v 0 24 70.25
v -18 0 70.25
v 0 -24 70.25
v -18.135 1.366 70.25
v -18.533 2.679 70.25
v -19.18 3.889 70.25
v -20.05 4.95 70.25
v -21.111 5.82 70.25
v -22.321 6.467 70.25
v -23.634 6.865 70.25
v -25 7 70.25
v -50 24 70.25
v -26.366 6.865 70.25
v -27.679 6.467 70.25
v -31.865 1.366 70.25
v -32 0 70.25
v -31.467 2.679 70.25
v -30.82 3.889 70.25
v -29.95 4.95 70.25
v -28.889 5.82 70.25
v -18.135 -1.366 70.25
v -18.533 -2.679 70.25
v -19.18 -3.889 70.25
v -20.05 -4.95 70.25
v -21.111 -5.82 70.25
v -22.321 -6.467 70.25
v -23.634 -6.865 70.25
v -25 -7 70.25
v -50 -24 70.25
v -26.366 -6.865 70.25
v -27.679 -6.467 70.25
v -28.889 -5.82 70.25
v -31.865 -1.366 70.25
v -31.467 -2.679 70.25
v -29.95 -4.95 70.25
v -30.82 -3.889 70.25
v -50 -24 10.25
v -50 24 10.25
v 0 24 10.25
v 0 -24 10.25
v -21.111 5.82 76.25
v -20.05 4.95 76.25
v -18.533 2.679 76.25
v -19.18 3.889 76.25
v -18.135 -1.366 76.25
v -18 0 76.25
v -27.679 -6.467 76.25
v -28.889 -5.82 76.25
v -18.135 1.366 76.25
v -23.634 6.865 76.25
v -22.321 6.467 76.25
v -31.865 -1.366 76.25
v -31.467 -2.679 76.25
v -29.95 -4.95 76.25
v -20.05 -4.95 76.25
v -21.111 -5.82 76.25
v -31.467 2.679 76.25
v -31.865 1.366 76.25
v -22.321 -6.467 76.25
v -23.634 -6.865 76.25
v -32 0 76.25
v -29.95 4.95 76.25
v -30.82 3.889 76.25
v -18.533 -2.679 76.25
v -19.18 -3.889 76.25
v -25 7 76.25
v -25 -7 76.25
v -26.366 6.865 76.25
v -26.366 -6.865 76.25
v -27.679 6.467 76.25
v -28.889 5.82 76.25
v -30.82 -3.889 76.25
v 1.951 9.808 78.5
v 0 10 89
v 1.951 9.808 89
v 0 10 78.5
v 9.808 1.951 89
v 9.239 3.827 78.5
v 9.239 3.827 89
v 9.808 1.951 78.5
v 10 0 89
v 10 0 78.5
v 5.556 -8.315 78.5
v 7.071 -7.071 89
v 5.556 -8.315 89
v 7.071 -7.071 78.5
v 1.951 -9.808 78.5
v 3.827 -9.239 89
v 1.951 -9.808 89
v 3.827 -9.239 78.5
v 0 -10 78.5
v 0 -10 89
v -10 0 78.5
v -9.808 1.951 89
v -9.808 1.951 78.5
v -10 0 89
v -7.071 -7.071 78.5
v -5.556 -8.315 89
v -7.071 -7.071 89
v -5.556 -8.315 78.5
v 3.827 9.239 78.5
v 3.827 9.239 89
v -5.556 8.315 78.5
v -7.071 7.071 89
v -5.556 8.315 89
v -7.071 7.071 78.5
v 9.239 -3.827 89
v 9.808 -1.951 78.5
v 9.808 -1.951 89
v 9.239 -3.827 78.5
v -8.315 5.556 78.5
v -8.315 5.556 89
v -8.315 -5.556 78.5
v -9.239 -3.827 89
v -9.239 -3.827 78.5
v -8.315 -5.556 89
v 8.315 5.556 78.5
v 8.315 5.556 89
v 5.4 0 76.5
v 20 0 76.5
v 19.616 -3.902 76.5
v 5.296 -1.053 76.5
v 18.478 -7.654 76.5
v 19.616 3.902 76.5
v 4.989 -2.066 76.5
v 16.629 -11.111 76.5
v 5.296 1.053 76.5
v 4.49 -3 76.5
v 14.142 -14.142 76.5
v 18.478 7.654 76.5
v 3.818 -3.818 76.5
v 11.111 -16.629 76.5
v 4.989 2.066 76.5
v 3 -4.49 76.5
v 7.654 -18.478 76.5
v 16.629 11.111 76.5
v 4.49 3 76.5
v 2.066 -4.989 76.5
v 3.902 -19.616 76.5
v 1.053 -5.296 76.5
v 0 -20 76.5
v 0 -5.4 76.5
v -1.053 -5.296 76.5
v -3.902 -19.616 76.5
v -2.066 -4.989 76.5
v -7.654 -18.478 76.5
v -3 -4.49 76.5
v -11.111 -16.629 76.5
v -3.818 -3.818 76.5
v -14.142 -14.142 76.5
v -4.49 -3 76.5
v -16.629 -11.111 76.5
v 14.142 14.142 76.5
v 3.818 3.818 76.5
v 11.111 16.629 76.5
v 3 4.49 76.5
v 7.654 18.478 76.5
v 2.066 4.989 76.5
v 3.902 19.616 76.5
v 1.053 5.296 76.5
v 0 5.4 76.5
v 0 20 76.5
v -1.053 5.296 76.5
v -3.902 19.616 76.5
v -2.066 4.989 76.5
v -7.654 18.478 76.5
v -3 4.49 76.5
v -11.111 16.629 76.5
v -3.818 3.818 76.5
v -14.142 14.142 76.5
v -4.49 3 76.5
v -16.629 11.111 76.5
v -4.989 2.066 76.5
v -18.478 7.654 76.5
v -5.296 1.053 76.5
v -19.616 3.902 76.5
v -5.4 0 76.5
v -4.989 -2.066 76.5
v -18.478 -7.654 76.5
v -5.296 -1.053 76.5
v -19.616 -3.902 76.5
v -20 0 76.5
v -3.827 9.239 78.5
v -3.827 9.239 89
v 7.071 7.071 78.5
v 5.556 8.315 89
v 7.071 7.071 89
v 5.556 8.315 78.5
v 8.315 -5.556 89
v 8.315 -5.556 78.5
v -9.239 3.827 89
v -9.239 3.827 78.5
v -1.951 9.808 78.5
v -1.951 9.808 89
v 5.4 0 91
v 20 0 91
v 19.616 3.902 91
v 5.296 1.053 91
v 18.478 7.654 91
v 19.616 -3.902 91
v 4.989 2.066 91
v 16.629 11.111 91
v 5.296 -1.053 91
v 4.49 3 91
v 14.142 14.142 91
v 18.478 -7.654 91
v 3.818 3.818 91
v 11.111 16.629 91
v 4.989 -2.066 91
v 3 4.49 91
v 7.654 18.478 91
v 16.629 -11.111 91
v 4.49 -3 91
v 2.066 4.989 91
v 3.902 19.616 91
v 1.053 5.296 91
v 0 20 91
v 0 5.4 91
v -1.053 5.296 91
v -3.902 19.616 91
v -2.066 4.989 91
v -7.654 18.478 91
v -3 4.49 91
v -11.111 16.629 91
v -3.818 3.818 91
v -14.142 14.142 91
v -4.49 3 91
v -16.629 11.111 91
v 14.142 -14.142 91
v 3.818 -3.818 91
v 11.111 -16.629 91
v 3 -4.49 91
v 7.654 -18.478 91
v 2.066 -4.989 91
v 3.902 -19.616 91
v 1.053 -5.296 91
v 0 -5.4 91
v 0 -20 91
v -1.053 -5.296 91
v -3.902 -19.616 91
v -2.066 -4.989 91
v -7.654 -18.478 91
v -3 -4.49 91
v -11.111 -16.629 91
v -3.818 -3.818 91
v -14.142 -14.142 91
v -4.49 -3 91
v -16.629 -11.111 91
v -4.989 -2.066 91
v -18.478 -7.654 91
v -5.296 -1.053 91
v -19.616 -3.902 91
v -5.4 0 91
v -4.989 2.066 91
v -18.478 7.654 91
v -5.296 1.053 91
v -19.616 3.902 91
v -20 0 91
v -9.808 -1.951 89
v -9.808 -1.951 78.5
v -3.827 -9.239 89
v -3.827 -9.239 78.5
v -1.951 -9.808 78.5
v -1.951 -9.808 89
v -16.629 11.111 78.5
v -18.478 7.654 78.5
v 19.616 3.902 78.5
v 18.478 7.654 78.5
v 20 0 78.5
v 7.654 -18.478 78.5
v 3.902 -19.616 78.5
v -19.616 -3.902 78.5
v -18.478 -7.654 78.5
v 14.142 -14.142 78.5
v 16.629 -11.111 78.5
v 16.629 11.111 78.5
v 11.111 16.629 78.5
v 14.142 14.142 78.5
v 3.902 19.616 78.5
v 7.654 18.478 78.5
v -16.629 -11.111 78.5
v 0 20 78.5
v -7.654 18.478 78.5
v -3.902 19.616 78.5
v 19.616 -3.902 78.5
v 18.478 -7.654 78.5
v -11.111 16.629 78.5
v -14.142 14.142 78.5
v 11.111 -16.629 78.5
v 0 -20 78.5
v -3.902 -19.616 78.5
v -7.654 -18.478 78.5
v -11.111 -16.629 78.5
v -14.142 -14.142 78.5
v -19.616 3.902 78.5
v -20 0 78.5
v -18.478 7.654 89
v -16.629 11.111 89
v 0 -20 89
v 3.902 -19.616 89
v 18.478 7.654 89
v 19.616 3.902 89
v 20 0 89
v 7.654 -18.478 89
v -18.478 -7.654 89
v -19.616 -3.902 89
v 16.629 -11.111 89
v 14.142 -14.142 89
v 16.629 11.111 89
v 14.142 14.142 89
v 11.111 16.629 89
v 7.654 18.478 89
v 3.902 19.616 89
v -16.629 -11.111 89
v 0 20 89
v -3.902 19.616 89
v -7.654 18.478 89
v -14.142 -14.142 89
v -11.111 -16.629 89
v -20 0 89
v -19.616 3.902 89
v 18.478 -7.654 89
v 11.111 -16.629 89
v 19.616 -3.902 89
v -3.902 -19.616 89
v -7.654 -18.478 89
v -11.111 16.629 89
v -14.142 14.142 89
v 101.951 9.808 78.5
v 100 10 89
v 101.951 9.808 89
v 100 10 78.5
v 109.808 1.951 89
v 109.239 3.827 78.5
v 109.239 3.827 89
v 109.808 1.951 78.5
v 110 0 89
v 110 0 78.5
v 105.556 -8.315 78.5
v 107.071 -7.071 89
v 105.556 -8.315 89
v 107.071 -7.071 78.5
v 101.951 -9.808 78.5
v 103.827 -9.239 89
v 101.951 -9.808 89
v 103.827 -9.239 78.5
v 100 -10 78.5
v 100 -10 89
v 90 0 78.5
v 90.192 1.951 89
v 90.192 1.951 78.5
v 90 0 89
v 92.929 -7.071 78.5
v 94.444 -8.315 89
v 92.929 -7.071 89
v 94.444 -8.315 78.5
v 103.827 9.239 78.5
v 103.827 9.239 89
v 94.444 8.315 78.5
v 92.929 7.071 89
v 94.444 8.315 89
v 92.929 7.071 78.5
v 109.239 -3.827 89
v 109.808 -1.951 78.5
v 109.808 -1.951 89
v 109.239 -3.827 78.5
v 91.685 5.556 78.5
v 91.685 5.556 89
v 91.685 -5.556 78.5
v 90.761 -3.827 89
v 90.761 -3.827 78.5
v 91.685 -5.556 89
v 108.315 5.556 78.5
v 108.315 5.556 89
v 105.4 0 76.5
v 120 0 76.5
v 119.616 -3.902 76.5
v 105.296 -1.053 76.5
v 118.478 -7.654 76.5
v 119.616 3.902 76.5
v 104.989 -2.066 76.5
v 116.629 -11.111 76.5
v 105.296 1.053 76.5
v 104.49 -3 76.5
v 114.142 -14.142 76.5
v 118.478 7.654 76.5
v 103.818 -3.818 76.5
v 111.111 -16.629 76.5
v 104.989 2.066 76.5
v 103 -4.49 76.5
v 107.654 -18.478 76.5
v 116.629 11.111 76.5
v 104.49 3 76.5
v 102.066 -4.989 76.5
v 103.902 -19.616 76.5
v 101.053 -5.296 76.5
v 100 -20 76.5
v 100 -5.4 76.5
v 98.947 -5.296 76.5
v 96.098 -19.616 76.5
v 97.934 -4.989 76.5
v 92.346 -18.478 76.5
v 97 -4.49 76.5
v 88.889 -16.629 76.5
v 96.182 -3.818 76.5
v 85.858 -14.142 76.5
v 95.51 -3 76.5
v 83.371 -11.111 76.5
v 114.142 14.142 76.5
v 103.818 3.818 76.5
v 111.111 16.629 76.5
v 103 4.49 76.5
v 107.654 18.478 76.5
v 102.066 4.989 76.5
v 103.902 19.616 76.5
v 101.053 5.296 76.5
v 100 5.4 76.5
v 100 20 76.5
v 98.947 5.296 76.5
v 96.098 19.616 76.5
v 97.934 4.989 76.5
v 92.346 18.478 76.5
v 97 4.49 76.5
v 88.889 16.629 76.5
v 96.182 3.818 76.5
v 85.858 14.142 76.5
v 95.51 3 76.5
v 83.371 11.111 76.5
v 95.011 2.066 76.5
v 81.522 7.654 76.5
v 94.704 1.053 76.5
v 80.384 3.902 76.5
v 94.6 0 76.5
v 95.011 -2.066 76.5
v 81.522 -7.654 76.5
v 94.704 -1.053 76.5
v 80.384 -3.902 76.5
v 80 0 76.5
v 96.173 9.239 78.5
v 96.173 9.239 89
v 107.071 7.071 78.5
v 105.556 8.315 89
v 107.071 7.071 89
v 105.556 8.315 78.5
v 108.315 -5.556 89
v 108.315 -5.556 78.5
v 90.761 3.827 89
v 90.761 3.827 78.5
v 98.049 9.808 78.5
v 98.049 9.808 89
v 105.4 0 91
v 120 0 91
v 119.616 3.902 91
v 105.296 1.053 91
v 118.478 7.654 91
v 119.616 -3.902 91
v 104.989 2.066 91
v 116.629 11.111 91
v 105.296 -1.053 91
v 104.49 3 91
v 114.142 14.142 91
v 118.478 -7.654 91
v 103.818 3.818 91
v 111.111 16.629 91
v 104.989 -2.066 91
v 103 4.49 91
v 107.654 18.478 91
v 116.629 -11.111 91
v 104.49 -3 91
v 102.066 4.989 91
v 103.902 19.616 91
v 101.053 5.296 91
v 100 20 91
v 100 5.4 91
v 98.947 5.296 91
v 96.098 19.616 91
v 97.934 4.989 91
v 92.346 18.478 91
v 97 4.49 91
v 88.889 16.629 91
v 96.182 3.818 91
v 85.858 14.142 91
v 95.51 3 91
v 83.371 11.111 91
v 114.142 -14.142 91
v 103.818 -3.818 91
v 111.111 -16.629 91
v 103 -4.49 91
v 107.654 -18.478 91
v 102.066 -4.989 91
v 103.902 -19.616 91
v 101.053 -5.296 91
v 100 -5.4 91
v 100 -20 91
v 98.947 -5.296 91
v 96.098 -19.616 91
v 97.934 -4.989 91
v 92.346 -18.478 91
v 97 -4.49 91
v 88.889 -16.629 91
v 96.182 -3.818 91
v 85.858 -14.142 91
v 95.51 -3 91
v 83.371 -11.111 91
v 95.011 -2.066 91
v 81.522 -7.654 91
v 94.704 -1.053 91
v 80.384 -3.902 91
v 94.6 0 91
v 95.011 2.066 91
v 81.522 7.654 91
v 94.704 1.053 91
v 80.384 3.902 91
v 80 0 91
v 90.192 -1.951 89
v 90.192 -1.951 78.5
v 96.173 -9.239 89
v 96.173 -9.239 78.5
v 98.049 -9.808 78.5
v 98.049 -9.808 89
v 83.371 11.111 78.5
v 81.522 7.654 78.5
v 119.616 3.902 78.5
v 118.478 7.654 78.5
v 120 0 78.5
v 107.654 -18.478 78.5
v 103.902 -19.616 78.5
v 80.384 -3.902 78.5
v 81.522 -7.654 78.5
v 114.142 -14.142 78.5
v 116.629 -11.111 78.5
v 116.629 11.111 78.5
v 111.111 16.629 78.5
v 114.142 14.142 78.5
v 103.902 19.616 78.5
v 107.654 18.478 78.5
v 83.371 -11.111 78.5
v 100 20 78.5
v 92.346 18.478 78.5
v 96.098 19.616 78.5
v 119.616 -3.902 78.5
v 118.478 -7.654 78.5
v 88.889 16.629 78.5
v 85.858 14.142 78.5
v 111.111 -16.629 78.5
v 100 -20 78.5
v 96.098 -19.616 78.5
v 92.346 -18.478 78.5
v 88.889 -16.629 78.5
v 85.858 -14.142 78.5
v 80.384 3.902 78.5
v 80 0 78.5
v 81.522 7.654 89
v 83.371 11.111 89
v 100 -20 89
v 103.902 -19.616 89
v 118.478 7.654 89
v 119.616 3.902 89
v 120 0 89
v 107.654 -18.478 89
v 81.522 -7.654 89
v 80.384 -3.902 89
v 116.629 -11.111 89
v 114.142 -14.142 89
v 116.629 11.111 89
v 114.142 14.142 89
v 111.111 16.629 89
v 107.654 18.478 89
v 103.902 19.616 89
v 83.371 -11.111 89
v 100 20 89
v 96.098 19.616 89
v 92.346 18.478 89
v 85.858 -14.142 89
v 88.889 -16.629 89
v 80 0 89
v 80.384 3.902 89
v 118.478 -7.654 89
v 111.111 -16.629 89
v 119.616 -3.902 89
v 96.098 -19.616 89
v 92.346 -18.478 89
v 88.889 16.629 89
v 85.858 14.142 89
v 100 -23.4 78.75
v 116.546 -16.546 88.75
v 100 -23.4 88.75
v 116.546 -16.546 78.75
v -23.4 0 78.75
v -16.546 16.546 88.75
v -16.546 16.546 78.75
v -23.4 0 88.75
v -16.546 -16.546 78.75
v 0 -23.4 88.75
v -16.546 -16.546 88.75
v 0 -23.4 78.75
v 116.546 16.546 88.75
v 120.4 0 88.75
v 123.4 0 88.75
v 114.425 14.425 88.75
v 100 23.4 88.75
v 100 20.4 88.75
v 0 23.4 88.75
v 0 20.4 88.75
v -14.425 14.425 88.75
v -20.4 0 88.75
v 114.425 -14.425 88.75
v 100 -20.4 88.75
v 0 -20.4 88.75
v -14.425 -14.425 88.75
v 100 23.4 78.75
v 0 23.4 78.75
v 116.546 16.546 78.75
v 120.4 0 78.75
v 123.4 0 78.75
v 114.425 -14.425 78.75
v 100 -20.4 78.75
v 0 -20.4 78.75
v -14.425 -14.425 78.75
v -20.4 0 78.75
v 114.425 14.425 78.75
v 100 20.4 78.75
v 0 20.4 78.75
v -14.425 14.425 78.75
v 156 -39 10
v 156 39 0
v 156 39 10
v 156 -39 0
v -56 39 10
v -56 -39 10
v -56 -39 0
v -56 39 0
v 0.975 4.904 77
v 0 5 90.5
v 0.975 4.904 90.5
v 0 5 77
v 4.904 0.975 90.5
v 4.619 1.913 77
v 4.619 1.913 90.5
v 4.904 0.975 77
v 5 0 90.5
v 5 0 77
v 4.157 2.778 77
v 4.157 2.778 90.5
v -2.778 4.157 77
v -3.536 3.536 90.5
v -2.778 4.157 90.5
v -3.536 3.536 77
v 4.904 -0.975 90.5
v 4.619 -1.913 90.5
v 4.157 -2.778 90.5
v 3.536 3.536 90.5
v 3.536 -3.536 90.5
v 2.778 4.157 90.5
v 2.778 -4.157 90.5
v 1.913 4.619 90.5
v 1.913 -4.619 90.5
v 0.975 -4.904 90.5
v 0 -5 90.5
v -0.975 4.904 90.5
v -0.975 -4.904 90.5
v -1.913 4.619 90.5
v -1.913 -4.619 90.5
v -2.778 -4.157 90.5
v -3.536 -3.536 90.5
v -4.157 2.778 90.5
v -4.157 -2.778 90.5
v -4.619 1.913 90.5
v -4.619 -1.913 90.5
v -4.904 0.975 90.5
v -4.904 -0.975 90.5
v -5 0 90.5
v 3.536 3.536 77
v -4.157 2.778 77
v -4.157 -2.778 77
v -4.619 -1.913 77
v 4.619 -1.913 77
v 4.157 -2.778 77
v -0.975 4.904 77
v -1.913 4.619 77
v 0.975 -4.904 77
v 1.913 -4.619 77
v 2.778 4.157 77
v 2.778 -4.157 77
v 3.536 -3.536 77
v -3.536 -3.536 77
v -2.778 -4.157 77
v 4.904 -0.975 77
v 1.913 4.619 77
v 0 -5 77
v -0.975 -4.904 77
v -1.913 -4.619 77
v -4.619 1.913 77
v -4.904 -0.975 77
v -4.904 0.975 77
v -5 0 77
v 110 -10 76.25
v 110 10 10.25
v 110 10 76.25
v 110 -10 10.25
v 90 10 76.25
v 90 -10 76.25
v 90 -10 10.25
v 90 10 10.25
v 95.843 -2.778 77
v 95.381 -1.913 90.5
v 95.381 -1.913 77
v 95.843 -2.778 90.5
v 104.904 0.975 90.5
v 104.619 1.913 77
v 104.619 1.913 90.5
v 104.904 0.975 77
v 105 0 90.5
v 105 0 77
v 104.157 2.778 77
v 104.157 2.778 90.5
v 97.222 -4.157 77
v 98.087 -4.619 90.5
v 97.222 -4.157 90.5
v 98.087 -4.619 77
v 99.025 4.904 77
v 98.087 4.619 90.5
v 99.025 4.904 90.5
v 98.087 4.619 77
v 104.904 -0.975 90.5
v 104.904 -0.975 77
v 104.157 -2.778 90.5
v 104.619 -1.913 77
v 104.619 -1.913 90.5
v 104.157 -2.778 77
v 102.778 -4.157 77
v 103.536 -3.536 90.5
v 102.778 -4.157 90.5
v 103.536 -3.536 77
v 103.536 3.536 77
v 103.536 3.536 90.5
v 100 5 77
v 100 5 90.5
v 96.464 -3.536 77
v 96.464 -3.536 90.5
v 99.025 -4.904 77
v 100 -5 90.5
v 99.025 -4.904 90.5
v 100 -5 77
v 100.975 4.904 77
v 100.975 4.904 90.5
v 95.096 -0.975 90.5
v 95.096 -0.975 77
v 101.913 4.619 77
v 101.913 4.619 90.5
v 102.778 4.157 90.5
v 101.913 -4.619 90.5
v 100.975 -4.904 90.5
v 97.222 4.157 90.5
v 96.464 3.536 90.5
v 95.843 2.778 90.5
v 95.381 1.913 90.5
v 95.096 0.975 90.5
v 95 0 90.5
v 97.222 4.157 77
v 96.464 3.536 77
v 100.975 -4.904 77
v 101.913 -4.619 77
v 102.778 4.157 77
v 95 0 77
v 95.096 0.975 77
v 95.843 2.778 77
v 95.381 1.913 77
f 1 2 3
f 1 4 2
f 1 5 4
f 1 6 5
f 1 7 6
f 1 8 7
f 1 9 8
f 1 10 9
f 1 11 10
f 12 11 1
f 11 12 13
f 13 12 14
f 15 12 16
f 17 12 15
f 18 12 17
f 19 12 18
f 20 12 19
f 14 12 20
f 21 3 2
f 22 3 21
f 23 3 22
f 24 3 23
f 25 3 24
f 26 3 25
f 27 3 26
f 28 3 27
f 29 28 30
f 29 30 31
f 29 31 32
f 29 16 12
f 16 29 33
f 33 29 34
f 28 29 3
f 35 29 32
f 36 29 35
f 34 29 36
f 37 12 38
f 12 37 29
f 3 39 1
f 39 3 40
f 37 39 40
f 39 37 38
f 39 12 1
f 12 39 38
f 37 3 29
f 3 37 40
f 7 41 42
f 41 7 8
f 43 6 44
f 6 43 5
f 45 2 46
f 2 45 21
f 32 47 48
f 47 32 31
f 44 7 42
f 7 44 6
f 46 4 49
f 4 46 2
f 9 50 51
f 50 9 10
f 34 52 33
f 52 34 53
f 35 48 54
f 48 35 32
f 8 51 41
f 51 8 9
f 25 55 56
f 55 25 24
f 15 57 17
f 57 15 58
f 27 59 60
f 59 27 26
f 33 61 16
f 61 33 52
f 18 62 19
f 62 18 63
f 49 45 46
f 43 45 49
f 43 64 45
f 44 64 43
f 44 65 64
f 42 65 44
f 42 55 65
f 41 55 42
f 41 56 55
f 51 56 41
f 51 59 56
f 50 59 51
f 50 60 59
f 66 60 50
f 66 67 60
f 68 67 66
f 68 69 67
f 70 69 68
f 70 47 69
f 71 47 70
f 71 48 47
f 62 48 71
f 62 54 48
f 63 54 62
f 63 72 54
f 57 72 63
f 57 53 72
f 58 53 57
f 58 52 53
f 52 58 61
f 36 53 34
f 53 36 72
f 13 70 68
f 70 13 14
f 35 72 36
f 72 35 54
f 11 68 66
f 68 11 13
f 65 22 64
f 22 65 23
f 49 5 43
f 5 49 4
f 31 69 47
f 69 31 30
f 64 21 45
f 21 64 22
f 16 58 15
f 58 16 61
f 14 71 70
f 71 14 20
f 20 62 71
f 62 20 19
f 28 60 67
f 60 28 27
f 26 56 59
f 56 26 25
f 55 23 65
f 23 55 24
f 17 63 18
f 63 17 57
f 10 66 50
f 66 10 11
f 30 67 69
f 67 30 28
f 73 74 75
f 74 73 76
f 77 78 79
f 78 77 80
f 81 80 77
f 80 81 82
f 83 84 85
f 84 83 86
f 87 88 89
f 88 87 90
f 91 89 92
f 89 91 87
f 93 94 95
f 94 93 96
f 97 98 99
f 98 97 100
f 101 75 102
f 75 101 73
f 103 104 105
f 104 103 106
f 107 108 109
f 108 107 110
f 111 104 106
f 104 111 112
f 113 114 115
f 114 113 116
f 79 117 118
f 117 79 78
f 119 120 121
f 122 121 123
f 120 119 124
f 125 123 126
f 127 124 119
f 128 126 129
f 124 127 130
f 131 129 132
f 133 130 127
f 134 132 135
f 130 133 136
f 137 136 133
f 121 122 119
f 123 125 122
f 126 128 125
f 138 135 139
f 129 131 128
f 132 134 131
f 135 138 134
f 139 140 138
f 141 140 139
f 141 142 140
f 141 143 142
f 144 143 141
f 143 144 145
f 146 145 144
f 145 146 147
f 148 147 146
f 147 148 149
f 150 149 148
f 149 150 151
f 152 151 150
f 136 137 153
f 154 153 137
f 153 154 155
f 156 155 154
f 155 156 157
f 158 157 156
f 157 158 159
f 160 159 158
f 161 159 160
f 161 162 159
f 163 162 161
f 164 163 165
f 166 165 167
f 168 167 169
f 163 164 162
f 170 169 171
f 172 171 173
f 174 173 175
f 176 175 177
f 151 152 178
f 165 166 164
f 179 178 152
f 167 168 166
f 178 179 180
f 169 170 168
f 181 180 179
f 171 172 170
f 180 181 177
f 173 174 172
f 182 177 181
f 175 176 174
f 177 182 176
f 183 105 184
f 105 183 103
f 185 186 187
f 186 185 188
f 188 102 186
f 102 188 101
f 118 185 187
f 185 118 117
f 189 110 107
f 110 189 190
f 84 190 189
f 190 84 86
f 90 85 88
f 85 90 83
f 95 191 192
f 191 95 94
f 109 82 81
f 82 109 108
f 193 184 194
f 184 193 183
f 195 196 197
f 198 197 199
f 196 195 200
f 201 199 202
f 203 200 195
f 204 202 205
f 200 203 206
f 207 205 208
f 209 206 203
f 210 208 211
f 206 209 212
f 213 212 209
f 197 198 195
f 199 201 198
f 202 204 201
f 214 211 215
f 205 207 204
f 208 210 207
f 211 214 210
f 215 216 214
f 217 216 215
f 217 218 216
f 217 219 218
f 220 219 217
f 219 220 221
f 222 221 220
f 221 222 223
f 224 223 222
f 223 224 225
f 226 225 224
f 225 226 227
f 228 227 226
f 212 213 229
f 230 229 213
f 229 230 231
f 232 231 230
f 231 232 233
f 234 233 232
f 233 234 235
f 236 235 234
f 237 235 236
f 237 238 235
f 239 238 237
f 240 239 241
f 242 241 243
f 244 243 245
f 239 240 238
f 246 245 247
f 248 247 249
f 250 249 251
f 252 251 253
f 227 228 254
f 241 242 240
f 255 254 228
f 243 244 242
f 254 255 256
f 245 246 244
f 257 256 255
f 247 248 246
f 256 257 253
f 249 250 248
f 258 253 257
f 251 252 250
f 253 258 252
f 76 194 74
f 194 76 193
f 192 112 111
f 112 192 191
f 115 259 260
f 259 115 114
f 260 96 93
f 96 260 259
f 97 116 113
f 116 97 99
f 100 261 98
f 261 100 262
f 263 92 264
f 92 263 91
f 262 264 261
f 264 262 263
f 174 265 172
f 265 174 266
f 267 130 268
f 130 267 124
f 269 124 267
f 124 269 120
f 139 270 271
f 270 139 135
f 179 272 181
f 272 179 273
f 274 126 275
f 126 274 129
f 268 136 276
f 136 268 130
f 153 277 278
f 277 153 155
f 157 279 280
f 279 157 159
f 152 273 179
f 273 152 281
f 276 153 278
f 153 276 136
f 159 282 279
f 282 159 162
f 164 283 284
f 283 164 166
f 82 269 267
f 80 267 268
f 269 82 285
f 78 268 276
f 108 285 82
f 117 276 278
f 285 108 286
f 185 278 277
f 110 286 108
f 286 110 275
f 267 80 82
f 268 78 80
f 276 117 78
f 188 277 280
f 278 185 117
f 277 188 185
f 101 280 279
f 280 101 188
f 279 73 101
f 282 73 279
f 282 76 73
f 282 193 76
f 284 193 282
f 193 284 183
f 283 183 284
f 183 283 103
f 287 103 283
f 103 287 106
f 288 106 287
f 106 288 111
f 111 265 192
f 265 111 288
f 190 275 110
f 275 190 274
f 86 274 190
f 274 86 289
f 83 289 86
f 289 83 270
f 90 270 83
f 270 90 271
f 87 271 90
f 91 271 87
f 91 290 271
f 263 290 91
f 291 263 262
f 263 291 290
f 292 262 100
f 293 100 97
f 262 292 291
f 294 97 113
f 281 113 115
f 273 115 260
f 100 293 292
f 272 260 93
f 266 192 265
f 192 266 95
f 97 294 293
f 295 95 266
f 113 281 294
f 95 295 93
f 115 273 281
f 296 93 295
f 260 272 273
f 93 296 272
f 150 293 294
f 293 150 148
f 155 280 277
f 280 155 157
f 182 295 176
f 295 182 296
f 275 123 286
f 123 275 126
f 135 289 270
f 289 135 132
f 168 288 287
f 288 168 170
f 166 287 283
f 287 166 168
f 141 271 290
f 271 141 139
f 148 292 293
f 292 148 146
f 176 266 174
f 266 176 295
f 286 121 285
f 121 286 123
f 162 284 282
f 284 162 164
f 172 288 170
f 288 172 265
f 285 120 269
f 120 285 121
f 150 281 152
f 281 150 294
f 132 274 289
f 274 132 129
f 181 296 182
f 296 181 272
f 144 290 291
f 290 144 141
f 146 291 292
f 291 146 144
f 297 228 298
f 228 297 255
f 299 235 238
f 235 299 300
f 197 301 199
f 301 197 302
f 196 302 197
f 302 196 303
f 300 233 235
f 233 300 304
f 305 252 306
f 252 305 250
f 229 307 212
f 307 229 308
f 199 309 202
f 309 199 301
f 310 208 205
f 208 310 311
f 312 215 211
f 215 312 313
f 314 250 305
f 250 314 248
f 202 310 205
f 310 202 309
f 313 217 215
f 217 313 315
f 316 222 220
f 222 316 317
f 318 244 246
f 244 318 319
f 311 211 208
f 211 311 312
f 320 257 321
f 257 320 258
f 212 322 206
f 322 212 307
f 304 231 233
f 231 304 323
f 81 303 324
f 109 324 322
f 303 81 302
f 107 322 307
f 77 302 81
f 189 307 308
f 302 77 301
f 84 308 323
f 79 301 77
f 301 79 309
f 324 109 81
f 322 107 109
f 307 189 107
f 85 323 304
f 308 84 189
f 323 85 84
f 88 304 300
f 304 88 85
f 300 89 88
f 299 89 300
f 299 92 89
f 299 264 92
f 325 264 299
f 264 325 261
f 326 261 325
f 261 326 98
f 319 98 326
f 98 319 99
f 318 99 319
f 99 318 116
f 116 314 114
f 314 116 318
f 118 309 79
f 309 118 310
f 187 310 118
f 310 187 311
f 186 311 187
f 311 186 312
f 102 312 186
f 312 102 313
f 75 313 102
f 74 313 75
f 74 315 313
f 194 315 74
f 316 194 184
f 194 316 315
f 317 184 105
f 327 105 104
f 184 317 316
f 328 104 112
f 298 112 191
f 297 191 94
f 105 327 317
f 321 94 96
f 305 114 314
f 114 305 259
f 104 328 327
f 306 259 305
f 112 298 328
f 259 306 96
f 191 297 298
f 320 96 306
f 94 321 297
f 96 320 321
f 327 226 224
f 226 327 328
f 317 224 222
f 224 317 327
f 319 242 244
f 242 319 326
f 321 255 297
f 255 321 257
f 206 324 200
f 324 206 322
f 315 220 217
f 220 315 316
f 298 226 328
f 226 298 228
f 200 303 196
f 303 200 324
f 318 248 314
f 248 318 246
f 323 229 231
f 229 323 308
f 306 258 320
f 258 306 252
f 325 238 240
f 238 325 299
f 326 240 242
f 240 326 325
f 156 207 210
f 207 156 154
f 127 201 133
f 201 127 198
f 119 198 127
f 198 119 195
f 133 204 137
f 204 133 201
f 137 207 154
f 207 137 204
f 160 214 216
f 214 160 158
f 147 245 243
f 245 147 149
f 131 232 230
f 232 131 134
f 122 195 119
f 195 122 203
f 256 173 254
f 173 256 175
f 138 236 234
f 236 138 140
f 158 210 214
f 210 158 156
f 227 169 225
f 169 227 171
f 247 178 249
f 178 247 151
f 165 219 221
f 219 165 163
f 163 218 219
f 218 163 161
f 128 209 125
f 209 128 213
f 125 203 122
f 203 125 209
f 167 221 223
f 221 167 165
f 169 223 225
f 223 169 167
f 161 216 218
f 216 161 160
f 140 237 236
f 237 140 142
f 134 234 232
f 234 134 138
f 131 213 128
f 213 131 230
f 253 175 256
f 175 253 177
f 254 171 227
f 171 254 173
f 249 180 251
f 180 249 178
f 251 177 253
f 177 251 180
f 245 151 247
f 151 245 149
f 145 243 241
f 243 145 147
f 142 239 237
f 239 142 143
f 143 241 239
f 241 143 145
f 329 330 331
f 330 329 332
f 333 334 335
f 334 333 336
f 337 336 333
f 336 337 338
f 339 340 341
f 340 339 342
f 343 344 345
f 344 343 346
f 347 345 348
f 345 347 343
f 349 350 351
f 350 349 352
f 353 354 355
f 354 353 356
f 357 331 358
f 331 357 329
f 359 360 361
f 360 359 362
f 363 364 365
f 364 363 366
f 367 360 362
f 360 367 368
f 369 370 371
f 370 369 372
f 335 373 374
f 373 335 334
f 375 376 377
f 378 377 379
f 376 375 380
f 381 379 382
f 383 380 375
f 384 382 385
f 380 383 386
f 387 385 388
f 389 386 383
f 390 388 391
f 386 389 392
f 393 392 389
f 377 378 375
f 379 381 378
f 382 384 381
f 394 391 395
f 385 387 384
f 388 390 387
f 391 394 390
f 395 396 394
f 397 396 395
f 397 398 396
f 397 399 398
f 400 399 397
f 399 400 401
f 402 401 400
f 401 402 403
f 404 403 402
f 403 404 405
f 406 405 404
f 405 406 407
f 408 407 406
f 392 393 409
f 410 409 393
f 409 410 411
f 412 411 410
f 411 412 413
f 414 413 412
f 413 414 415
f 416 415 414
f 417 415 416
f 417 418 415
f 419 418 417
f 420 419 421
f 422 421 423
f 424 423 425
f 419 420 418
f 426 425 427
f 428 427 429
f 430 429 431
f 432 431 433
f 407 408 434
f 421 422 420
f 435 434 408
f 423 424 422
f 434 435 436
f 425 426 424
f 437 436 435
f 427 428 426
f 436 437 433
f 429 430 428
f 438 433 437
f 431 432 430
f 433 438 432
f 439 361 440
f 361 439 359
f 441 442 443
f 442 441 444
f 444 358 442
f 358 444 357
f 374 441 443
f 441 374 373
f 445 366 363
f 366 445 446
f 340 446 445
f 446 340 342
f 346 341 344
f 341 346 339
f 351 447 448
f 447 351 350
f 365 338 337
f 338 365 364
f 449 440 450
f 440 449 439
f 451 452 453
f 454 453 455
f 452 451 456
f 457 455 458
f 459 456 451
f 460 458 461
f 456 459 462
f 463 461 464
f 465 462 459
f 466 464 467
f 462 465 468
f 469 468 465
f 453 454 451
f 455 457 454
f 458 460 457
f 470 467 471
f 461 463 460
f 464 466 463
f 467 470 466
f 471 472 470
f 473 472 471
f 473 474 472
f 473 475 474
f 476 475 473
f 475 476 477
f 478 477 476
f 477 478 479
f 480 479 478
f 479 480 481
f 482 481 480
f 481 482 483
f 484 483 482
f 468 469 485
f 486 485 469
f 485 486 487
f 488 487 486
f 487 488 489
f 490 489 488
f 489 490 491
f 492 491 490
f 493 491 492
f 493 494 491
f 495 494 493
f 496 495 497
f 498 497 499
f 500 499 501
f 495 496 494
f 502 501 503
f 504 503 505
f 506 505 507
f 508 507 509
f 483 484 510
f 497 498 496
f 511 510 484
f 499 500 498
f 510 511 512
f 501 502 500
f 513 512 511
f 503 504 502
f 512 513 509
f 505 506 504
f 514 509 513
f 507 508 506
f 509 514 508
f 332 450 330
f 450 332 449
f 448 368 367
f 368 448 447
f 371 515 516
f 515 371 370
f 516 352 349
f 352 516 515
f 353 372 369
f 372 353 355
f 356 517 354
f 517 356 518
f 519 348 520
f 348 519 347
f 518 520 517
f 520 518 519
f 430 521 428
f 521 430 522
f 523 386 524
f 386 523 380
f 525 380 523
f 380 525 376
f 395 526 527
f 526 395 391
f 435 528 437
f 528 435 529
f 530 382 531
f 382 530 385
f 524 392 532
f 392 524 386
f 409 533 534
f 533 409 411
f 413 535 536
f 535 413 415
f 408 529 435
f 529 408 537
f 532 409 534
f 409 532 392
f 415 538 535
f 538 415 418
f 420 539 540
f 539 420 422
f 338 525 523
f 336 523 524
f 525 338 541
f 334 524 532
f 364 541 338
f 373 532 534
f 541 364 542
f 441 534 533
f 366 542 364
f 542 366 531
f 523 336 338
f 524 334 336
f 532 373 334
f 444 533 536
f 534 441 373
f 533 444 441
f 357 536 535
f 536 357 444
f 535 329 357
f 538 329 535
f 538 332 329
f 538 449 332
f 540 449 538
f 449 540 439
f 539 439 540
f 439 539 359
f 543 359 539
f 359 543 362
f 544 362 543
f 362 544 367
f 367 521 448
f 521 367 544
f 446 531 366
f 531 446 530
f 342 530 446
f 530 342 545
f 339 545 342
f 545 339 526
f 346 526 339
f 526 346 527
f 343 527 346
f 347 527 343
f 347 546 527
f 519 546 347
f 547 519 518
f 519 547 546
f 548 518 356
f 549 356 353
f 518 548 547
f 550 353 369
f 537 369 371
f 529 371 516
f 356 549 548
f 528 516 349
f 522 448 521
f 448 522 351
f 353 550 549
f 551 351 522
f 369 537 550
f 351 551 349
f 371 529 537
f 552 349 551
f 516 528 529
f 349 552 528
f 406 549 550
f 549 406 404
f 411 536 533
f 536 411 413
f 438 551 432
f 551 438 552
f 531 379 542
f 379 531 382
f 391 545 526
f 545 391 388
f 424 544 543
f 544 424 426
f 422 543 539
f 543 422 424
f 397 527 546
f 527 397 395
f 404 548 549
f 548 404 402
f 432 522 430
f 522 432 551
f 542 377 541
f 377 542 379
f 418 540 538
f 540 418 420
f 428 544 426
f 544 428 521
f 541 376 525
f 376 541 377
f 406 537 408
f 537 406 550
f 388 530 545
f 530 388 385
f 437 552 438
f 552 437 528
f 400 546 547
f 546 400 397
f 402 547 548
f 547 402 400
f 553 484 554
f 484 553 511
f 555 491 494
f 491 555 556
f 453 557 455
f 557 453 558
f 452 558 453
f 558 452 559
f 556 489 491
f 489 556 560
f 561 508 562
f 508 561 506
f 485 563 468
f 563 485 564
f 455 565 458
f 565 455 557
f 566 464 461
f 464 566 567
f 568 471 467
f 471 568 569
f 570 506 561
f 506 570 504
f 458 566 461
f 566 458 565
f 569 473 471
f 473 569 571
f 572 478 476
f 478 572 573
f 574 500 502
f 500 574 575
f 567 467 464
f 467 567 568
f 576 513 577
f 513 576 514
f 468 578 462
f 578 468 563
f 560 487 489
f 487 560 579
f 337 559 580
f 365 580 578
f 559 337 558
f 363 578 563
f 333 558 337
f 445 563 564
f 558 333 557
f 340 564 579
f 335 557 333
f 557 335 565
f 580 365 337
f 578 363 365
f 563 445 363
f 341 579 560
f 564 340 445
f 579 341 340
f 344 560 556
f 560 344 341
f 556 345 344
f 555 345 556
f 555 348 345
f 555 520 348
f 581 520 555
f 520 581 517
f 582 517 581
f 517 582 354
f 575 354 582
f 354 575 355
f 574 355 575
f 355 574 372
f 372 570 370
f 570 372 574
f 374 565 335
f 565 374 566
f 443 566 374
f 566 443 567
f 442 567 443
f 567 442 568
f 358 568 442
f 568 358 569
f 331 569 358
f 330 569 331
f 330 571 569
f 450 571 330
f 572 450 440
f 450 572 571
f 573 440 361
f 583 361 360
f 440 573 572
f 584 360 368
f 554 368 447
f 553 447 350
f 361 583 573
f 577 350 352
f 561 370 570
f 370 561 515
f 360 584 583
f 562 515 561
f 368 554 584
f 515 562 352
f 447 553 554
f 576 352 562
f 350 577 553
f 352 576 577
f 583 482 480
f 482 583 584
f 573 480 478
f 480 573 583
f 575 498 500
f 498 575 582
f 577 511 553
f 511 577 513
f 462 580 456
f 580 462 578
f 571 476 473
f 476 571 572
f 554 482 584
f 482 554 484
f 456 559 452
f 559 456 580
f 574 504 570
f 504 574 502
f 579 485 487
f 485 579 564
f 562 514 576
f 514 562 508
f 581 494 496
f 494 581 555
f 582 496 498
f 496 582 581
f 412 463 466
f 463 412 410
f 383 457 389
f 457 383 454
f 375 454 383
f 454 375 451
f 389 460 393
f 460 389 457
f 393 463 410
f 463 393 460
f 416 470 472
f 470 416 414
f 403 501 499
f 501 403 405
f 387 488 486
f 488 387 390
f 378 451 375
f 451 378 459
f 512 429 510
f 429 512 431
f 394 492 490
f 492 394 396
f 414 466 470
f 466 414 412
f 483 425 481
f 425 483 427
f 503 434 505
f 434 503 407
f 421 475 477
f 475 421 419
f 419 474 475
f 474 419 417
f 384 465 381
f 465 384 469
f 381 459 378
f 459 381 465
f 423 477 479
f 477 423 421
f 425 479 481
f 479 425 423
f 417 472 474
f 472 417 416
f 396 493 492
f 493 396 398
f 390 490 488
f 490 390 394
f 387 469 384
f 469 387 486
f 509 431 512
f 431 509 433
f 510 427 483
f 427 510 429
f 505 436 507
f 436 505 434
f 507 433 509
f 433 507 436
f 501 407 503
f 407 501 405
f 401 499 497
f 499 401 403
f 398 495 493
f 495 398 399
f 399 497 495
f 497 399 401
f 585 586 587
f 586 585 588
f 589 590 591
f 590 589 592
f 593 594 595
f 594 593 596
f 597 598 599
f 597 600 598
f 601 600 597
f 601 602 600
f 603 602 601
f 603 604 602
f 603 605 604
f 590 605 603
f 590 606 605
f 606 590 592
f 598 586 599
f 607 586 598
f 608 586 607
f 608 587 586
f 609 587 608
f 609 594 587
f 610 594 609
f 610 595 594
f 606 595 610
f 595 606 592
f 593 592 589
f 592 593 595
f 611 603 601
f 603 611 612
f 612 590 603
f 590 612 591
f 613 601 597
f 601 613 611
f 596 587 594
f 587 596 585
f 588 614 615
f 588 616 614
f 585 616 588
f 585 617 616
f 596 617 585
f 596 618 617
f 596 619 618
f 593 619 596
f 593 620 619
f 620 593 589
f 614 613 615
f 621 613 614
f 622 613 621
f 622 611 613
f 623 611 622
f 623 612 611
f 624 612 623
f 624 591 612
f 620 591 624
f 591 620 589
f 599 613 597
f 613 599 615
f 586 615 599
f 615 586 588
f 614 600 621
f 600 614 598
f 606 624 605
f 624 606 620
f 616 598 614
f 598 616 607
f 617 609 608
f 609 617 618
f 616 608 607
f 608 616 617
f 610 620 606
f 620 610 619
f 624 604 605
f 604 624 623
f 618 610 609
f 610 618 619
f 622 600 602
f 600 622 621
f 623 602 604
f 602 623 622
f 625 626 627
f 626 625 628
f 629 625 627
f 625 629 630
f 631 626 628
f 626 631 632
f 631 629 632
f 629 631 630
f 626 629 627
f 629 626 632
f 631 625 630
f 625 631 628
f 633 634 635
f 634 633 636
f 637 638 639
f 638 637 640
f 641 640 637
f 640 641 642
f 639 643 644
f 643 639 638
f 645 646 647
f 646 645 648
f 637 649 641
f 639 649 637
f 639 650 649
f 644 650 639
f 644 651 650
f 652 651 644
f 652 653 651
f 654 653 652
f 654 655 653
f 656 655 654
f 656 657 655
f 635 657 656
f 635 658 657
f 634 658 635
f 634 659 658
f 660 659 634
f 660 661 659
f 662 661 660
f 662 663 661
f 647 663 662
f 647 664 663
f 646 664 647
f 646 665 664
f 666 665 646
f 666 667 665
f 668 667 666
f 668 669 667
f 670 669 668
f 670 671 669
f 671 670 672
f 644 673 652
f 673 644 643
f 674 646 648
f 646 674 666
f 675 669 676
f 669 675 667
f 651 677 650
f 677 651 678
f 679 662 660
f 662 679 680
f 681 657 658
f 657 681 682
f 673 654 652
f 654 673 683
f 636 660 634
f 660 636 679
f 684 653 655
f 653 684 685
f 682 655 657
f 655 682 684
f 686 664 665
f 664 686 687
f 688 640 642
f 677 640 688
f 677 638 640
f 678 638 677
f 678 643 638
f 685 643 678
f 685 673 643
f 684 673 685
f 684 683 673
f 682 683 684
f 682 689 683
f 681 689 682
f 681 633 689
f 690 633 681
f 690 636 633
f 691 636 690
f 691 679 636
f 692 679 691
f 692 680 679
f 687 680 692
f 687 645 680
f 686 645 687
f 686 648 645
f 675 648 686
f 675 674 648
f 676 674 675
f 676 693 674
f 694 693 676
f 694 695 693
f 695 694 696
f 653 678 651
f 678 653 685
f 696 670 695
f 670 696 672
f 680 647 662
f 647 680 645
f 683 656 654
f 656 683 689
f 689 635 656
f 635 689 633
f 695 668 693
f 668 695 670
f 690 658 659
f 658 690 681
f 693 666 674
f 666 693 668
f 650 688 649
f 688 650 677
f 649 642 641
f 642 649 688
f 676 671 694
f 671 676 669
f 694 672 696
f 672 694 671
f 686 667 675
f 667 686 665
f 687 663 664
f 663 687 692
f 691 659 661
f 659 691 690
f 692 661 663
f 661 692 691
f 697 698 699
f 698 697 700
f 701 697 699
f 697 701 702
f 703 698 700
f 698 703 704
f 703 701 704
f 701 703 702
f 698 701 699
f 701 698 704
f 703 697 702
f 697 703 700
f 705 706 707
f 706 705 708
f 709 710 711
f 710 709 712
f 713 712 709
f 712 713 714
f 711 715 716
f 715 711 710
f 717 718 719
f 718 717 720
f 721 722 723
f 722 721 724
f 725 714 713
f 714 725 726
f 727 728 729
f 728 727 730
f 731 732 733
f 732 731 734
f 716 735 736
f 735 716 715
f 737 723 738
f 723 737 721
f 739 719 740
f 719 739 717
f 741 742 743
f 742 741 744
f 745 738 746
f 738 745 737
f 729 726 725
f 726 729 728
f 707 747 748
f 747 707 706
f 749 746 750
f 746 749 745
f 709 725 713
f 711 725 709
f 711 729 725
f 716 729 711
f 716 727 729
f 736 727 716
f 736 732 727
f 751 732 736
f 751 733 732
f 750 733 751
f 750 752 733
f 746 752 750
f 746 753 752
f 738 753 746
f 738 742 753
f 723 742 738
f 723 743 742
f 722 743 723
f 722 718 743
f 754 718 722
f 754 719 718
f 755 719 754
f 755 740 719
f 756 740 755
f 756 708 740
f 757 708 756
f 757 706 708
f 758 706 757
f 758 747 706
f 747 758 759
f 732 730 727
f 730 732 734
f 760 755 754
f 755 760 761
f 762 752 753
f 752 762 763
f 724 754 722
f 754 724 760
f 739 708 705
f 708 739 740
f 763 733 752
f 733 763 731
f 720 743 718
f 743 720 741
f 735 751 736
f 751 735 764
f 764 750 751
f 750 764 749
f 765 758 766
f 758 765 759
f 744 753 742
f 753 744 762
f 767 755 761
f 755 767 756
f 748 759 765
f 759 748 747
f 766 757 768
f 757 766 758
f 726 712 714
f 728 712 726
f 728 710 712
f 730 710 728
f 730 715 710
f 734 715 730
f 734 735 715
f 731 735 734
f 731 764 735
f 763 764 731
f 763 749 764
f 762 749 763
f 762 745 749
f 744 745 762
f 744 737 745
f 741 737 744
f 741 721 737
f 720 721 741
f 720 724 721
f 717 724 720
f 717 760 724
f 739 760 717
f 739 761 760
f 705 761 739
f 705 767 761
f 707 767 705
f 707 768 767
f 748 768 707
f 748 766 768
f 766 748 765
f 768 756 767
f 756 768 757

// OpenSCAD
$fn = 32;

// ------------------------------------------------------------------------
// Motor belt drive: span 100 mm, pulleys d40, belt 10 mm wide
// Every part is its own module, assembly() places every instance.
// ------------------------------------------------------------------------

// --- part 1 ---
module base_plate() {
  difference() {
    translate([-106, -39, 0]) cube([212, 78, 10]);
  }
}

// --- part 2 ---
module motor() {
  union() {
    translate([-30, -24, 0]) cube([60, 48, 50]);
    translate([33, 0, 25]) rotate([0, 90, 0]) cylinder(h = 6, d = 14, center = true);
  }
}

// --- part 3 ---
module drive_shaft() {
  translate([0, 0, -6.75]) cylinder(h = 13.5, d = 10);
}

// --- part 4 ---
module pulley_drive() {
  difference() {
    union() {
      cylinder(h = 14.5, d = 20);
      cylinder(h = 2, d = 40);
      translate([0, 0, 12.5]) cylinder(h = 2, d = 40);
    }
    translate([0, 0, -1]) cylinder(h = 16.5, d = 10.8);
  }
}

// --- part 5 ---
module idler_post() {
  translate([-10, -10, 0]) cube([20, 20, 66]);
}

// --- part 6 ---
module driven_shaft() {
  translate([0, 0, -6.75]) cylinder(h = 13.5, d = 10);
}

// --- part 7 ---
module pulley_driven() {
  difference() {
    union() {
      cylinder(h = 14.5, d = 20);
      cylinder(h = 2, d = 40);
      translate([0, 0, 12.5]) cylinder(h = 2, d = 40);
    }
    translate([0, 0, -1]) cylinder(h = 16.5, d = 10.8);
  }
}

// --- part 8 ---
module drive_belt() {
  difference() {
    linear_extrude(height = 10) polygon(points = concat([for (a = [90 : 45 : 270]) [23.4 * cos(a), 23.4 * sin(a)]], [for (a = [270 : 45 : 450]) [100 + 23.4 * cos(a), 23.4 * sin(a)]]));
    translate([0, 0, -1]) linear_extrude(height = 12) polygon(points = concat([for (a = [90 : 45 : 270]) [20.4 * cos(a), 20.4 * sin(a)]], [for (a = [270 : 45 : 450]) [100 + 20.4 * cos(a), 20.4 * sin(a)]]));
  }
}

// --- assembly ---
module assembly() {
  color([0.80, 0.24, 0.20]) translate([50, 0, 0]) rotate([0, 0, 0]) base_plate();
  color([0.20, 0.45, 0.75]) translate([0, 0, 40.25]) rotate([0, 270, 0]) motor();
  color([0.25, 0.62, 0.32]) translate([0, 0, 83.75]) rotate([0, 0, 0]) drive_shaft();
  color([0.92, 0.70, 0.18]) translate([0, 0, 76.5]) rotate([0, 0, 0]) pulley_drive();
  color([0.58, 0.35, 0.70]) translate([100, 0, 10.25]) rotate([0, 0, 0]) idler_post();
  color([0.16, 0.66, 0.66]) translate([100, 0, 83.75]) rotate([0, 0, 0]) driven_shaft();
  color([0.85, 0.48, 0.18]) translate([100, 0, 76.5]) rotate([0, 0, 0]) pulley_driven();
  color([0.55, 0.60, 0.65]) translate([0, 0, 78.75]) rotate([0, 0, 0]) drive_belt();
}

assembly();
